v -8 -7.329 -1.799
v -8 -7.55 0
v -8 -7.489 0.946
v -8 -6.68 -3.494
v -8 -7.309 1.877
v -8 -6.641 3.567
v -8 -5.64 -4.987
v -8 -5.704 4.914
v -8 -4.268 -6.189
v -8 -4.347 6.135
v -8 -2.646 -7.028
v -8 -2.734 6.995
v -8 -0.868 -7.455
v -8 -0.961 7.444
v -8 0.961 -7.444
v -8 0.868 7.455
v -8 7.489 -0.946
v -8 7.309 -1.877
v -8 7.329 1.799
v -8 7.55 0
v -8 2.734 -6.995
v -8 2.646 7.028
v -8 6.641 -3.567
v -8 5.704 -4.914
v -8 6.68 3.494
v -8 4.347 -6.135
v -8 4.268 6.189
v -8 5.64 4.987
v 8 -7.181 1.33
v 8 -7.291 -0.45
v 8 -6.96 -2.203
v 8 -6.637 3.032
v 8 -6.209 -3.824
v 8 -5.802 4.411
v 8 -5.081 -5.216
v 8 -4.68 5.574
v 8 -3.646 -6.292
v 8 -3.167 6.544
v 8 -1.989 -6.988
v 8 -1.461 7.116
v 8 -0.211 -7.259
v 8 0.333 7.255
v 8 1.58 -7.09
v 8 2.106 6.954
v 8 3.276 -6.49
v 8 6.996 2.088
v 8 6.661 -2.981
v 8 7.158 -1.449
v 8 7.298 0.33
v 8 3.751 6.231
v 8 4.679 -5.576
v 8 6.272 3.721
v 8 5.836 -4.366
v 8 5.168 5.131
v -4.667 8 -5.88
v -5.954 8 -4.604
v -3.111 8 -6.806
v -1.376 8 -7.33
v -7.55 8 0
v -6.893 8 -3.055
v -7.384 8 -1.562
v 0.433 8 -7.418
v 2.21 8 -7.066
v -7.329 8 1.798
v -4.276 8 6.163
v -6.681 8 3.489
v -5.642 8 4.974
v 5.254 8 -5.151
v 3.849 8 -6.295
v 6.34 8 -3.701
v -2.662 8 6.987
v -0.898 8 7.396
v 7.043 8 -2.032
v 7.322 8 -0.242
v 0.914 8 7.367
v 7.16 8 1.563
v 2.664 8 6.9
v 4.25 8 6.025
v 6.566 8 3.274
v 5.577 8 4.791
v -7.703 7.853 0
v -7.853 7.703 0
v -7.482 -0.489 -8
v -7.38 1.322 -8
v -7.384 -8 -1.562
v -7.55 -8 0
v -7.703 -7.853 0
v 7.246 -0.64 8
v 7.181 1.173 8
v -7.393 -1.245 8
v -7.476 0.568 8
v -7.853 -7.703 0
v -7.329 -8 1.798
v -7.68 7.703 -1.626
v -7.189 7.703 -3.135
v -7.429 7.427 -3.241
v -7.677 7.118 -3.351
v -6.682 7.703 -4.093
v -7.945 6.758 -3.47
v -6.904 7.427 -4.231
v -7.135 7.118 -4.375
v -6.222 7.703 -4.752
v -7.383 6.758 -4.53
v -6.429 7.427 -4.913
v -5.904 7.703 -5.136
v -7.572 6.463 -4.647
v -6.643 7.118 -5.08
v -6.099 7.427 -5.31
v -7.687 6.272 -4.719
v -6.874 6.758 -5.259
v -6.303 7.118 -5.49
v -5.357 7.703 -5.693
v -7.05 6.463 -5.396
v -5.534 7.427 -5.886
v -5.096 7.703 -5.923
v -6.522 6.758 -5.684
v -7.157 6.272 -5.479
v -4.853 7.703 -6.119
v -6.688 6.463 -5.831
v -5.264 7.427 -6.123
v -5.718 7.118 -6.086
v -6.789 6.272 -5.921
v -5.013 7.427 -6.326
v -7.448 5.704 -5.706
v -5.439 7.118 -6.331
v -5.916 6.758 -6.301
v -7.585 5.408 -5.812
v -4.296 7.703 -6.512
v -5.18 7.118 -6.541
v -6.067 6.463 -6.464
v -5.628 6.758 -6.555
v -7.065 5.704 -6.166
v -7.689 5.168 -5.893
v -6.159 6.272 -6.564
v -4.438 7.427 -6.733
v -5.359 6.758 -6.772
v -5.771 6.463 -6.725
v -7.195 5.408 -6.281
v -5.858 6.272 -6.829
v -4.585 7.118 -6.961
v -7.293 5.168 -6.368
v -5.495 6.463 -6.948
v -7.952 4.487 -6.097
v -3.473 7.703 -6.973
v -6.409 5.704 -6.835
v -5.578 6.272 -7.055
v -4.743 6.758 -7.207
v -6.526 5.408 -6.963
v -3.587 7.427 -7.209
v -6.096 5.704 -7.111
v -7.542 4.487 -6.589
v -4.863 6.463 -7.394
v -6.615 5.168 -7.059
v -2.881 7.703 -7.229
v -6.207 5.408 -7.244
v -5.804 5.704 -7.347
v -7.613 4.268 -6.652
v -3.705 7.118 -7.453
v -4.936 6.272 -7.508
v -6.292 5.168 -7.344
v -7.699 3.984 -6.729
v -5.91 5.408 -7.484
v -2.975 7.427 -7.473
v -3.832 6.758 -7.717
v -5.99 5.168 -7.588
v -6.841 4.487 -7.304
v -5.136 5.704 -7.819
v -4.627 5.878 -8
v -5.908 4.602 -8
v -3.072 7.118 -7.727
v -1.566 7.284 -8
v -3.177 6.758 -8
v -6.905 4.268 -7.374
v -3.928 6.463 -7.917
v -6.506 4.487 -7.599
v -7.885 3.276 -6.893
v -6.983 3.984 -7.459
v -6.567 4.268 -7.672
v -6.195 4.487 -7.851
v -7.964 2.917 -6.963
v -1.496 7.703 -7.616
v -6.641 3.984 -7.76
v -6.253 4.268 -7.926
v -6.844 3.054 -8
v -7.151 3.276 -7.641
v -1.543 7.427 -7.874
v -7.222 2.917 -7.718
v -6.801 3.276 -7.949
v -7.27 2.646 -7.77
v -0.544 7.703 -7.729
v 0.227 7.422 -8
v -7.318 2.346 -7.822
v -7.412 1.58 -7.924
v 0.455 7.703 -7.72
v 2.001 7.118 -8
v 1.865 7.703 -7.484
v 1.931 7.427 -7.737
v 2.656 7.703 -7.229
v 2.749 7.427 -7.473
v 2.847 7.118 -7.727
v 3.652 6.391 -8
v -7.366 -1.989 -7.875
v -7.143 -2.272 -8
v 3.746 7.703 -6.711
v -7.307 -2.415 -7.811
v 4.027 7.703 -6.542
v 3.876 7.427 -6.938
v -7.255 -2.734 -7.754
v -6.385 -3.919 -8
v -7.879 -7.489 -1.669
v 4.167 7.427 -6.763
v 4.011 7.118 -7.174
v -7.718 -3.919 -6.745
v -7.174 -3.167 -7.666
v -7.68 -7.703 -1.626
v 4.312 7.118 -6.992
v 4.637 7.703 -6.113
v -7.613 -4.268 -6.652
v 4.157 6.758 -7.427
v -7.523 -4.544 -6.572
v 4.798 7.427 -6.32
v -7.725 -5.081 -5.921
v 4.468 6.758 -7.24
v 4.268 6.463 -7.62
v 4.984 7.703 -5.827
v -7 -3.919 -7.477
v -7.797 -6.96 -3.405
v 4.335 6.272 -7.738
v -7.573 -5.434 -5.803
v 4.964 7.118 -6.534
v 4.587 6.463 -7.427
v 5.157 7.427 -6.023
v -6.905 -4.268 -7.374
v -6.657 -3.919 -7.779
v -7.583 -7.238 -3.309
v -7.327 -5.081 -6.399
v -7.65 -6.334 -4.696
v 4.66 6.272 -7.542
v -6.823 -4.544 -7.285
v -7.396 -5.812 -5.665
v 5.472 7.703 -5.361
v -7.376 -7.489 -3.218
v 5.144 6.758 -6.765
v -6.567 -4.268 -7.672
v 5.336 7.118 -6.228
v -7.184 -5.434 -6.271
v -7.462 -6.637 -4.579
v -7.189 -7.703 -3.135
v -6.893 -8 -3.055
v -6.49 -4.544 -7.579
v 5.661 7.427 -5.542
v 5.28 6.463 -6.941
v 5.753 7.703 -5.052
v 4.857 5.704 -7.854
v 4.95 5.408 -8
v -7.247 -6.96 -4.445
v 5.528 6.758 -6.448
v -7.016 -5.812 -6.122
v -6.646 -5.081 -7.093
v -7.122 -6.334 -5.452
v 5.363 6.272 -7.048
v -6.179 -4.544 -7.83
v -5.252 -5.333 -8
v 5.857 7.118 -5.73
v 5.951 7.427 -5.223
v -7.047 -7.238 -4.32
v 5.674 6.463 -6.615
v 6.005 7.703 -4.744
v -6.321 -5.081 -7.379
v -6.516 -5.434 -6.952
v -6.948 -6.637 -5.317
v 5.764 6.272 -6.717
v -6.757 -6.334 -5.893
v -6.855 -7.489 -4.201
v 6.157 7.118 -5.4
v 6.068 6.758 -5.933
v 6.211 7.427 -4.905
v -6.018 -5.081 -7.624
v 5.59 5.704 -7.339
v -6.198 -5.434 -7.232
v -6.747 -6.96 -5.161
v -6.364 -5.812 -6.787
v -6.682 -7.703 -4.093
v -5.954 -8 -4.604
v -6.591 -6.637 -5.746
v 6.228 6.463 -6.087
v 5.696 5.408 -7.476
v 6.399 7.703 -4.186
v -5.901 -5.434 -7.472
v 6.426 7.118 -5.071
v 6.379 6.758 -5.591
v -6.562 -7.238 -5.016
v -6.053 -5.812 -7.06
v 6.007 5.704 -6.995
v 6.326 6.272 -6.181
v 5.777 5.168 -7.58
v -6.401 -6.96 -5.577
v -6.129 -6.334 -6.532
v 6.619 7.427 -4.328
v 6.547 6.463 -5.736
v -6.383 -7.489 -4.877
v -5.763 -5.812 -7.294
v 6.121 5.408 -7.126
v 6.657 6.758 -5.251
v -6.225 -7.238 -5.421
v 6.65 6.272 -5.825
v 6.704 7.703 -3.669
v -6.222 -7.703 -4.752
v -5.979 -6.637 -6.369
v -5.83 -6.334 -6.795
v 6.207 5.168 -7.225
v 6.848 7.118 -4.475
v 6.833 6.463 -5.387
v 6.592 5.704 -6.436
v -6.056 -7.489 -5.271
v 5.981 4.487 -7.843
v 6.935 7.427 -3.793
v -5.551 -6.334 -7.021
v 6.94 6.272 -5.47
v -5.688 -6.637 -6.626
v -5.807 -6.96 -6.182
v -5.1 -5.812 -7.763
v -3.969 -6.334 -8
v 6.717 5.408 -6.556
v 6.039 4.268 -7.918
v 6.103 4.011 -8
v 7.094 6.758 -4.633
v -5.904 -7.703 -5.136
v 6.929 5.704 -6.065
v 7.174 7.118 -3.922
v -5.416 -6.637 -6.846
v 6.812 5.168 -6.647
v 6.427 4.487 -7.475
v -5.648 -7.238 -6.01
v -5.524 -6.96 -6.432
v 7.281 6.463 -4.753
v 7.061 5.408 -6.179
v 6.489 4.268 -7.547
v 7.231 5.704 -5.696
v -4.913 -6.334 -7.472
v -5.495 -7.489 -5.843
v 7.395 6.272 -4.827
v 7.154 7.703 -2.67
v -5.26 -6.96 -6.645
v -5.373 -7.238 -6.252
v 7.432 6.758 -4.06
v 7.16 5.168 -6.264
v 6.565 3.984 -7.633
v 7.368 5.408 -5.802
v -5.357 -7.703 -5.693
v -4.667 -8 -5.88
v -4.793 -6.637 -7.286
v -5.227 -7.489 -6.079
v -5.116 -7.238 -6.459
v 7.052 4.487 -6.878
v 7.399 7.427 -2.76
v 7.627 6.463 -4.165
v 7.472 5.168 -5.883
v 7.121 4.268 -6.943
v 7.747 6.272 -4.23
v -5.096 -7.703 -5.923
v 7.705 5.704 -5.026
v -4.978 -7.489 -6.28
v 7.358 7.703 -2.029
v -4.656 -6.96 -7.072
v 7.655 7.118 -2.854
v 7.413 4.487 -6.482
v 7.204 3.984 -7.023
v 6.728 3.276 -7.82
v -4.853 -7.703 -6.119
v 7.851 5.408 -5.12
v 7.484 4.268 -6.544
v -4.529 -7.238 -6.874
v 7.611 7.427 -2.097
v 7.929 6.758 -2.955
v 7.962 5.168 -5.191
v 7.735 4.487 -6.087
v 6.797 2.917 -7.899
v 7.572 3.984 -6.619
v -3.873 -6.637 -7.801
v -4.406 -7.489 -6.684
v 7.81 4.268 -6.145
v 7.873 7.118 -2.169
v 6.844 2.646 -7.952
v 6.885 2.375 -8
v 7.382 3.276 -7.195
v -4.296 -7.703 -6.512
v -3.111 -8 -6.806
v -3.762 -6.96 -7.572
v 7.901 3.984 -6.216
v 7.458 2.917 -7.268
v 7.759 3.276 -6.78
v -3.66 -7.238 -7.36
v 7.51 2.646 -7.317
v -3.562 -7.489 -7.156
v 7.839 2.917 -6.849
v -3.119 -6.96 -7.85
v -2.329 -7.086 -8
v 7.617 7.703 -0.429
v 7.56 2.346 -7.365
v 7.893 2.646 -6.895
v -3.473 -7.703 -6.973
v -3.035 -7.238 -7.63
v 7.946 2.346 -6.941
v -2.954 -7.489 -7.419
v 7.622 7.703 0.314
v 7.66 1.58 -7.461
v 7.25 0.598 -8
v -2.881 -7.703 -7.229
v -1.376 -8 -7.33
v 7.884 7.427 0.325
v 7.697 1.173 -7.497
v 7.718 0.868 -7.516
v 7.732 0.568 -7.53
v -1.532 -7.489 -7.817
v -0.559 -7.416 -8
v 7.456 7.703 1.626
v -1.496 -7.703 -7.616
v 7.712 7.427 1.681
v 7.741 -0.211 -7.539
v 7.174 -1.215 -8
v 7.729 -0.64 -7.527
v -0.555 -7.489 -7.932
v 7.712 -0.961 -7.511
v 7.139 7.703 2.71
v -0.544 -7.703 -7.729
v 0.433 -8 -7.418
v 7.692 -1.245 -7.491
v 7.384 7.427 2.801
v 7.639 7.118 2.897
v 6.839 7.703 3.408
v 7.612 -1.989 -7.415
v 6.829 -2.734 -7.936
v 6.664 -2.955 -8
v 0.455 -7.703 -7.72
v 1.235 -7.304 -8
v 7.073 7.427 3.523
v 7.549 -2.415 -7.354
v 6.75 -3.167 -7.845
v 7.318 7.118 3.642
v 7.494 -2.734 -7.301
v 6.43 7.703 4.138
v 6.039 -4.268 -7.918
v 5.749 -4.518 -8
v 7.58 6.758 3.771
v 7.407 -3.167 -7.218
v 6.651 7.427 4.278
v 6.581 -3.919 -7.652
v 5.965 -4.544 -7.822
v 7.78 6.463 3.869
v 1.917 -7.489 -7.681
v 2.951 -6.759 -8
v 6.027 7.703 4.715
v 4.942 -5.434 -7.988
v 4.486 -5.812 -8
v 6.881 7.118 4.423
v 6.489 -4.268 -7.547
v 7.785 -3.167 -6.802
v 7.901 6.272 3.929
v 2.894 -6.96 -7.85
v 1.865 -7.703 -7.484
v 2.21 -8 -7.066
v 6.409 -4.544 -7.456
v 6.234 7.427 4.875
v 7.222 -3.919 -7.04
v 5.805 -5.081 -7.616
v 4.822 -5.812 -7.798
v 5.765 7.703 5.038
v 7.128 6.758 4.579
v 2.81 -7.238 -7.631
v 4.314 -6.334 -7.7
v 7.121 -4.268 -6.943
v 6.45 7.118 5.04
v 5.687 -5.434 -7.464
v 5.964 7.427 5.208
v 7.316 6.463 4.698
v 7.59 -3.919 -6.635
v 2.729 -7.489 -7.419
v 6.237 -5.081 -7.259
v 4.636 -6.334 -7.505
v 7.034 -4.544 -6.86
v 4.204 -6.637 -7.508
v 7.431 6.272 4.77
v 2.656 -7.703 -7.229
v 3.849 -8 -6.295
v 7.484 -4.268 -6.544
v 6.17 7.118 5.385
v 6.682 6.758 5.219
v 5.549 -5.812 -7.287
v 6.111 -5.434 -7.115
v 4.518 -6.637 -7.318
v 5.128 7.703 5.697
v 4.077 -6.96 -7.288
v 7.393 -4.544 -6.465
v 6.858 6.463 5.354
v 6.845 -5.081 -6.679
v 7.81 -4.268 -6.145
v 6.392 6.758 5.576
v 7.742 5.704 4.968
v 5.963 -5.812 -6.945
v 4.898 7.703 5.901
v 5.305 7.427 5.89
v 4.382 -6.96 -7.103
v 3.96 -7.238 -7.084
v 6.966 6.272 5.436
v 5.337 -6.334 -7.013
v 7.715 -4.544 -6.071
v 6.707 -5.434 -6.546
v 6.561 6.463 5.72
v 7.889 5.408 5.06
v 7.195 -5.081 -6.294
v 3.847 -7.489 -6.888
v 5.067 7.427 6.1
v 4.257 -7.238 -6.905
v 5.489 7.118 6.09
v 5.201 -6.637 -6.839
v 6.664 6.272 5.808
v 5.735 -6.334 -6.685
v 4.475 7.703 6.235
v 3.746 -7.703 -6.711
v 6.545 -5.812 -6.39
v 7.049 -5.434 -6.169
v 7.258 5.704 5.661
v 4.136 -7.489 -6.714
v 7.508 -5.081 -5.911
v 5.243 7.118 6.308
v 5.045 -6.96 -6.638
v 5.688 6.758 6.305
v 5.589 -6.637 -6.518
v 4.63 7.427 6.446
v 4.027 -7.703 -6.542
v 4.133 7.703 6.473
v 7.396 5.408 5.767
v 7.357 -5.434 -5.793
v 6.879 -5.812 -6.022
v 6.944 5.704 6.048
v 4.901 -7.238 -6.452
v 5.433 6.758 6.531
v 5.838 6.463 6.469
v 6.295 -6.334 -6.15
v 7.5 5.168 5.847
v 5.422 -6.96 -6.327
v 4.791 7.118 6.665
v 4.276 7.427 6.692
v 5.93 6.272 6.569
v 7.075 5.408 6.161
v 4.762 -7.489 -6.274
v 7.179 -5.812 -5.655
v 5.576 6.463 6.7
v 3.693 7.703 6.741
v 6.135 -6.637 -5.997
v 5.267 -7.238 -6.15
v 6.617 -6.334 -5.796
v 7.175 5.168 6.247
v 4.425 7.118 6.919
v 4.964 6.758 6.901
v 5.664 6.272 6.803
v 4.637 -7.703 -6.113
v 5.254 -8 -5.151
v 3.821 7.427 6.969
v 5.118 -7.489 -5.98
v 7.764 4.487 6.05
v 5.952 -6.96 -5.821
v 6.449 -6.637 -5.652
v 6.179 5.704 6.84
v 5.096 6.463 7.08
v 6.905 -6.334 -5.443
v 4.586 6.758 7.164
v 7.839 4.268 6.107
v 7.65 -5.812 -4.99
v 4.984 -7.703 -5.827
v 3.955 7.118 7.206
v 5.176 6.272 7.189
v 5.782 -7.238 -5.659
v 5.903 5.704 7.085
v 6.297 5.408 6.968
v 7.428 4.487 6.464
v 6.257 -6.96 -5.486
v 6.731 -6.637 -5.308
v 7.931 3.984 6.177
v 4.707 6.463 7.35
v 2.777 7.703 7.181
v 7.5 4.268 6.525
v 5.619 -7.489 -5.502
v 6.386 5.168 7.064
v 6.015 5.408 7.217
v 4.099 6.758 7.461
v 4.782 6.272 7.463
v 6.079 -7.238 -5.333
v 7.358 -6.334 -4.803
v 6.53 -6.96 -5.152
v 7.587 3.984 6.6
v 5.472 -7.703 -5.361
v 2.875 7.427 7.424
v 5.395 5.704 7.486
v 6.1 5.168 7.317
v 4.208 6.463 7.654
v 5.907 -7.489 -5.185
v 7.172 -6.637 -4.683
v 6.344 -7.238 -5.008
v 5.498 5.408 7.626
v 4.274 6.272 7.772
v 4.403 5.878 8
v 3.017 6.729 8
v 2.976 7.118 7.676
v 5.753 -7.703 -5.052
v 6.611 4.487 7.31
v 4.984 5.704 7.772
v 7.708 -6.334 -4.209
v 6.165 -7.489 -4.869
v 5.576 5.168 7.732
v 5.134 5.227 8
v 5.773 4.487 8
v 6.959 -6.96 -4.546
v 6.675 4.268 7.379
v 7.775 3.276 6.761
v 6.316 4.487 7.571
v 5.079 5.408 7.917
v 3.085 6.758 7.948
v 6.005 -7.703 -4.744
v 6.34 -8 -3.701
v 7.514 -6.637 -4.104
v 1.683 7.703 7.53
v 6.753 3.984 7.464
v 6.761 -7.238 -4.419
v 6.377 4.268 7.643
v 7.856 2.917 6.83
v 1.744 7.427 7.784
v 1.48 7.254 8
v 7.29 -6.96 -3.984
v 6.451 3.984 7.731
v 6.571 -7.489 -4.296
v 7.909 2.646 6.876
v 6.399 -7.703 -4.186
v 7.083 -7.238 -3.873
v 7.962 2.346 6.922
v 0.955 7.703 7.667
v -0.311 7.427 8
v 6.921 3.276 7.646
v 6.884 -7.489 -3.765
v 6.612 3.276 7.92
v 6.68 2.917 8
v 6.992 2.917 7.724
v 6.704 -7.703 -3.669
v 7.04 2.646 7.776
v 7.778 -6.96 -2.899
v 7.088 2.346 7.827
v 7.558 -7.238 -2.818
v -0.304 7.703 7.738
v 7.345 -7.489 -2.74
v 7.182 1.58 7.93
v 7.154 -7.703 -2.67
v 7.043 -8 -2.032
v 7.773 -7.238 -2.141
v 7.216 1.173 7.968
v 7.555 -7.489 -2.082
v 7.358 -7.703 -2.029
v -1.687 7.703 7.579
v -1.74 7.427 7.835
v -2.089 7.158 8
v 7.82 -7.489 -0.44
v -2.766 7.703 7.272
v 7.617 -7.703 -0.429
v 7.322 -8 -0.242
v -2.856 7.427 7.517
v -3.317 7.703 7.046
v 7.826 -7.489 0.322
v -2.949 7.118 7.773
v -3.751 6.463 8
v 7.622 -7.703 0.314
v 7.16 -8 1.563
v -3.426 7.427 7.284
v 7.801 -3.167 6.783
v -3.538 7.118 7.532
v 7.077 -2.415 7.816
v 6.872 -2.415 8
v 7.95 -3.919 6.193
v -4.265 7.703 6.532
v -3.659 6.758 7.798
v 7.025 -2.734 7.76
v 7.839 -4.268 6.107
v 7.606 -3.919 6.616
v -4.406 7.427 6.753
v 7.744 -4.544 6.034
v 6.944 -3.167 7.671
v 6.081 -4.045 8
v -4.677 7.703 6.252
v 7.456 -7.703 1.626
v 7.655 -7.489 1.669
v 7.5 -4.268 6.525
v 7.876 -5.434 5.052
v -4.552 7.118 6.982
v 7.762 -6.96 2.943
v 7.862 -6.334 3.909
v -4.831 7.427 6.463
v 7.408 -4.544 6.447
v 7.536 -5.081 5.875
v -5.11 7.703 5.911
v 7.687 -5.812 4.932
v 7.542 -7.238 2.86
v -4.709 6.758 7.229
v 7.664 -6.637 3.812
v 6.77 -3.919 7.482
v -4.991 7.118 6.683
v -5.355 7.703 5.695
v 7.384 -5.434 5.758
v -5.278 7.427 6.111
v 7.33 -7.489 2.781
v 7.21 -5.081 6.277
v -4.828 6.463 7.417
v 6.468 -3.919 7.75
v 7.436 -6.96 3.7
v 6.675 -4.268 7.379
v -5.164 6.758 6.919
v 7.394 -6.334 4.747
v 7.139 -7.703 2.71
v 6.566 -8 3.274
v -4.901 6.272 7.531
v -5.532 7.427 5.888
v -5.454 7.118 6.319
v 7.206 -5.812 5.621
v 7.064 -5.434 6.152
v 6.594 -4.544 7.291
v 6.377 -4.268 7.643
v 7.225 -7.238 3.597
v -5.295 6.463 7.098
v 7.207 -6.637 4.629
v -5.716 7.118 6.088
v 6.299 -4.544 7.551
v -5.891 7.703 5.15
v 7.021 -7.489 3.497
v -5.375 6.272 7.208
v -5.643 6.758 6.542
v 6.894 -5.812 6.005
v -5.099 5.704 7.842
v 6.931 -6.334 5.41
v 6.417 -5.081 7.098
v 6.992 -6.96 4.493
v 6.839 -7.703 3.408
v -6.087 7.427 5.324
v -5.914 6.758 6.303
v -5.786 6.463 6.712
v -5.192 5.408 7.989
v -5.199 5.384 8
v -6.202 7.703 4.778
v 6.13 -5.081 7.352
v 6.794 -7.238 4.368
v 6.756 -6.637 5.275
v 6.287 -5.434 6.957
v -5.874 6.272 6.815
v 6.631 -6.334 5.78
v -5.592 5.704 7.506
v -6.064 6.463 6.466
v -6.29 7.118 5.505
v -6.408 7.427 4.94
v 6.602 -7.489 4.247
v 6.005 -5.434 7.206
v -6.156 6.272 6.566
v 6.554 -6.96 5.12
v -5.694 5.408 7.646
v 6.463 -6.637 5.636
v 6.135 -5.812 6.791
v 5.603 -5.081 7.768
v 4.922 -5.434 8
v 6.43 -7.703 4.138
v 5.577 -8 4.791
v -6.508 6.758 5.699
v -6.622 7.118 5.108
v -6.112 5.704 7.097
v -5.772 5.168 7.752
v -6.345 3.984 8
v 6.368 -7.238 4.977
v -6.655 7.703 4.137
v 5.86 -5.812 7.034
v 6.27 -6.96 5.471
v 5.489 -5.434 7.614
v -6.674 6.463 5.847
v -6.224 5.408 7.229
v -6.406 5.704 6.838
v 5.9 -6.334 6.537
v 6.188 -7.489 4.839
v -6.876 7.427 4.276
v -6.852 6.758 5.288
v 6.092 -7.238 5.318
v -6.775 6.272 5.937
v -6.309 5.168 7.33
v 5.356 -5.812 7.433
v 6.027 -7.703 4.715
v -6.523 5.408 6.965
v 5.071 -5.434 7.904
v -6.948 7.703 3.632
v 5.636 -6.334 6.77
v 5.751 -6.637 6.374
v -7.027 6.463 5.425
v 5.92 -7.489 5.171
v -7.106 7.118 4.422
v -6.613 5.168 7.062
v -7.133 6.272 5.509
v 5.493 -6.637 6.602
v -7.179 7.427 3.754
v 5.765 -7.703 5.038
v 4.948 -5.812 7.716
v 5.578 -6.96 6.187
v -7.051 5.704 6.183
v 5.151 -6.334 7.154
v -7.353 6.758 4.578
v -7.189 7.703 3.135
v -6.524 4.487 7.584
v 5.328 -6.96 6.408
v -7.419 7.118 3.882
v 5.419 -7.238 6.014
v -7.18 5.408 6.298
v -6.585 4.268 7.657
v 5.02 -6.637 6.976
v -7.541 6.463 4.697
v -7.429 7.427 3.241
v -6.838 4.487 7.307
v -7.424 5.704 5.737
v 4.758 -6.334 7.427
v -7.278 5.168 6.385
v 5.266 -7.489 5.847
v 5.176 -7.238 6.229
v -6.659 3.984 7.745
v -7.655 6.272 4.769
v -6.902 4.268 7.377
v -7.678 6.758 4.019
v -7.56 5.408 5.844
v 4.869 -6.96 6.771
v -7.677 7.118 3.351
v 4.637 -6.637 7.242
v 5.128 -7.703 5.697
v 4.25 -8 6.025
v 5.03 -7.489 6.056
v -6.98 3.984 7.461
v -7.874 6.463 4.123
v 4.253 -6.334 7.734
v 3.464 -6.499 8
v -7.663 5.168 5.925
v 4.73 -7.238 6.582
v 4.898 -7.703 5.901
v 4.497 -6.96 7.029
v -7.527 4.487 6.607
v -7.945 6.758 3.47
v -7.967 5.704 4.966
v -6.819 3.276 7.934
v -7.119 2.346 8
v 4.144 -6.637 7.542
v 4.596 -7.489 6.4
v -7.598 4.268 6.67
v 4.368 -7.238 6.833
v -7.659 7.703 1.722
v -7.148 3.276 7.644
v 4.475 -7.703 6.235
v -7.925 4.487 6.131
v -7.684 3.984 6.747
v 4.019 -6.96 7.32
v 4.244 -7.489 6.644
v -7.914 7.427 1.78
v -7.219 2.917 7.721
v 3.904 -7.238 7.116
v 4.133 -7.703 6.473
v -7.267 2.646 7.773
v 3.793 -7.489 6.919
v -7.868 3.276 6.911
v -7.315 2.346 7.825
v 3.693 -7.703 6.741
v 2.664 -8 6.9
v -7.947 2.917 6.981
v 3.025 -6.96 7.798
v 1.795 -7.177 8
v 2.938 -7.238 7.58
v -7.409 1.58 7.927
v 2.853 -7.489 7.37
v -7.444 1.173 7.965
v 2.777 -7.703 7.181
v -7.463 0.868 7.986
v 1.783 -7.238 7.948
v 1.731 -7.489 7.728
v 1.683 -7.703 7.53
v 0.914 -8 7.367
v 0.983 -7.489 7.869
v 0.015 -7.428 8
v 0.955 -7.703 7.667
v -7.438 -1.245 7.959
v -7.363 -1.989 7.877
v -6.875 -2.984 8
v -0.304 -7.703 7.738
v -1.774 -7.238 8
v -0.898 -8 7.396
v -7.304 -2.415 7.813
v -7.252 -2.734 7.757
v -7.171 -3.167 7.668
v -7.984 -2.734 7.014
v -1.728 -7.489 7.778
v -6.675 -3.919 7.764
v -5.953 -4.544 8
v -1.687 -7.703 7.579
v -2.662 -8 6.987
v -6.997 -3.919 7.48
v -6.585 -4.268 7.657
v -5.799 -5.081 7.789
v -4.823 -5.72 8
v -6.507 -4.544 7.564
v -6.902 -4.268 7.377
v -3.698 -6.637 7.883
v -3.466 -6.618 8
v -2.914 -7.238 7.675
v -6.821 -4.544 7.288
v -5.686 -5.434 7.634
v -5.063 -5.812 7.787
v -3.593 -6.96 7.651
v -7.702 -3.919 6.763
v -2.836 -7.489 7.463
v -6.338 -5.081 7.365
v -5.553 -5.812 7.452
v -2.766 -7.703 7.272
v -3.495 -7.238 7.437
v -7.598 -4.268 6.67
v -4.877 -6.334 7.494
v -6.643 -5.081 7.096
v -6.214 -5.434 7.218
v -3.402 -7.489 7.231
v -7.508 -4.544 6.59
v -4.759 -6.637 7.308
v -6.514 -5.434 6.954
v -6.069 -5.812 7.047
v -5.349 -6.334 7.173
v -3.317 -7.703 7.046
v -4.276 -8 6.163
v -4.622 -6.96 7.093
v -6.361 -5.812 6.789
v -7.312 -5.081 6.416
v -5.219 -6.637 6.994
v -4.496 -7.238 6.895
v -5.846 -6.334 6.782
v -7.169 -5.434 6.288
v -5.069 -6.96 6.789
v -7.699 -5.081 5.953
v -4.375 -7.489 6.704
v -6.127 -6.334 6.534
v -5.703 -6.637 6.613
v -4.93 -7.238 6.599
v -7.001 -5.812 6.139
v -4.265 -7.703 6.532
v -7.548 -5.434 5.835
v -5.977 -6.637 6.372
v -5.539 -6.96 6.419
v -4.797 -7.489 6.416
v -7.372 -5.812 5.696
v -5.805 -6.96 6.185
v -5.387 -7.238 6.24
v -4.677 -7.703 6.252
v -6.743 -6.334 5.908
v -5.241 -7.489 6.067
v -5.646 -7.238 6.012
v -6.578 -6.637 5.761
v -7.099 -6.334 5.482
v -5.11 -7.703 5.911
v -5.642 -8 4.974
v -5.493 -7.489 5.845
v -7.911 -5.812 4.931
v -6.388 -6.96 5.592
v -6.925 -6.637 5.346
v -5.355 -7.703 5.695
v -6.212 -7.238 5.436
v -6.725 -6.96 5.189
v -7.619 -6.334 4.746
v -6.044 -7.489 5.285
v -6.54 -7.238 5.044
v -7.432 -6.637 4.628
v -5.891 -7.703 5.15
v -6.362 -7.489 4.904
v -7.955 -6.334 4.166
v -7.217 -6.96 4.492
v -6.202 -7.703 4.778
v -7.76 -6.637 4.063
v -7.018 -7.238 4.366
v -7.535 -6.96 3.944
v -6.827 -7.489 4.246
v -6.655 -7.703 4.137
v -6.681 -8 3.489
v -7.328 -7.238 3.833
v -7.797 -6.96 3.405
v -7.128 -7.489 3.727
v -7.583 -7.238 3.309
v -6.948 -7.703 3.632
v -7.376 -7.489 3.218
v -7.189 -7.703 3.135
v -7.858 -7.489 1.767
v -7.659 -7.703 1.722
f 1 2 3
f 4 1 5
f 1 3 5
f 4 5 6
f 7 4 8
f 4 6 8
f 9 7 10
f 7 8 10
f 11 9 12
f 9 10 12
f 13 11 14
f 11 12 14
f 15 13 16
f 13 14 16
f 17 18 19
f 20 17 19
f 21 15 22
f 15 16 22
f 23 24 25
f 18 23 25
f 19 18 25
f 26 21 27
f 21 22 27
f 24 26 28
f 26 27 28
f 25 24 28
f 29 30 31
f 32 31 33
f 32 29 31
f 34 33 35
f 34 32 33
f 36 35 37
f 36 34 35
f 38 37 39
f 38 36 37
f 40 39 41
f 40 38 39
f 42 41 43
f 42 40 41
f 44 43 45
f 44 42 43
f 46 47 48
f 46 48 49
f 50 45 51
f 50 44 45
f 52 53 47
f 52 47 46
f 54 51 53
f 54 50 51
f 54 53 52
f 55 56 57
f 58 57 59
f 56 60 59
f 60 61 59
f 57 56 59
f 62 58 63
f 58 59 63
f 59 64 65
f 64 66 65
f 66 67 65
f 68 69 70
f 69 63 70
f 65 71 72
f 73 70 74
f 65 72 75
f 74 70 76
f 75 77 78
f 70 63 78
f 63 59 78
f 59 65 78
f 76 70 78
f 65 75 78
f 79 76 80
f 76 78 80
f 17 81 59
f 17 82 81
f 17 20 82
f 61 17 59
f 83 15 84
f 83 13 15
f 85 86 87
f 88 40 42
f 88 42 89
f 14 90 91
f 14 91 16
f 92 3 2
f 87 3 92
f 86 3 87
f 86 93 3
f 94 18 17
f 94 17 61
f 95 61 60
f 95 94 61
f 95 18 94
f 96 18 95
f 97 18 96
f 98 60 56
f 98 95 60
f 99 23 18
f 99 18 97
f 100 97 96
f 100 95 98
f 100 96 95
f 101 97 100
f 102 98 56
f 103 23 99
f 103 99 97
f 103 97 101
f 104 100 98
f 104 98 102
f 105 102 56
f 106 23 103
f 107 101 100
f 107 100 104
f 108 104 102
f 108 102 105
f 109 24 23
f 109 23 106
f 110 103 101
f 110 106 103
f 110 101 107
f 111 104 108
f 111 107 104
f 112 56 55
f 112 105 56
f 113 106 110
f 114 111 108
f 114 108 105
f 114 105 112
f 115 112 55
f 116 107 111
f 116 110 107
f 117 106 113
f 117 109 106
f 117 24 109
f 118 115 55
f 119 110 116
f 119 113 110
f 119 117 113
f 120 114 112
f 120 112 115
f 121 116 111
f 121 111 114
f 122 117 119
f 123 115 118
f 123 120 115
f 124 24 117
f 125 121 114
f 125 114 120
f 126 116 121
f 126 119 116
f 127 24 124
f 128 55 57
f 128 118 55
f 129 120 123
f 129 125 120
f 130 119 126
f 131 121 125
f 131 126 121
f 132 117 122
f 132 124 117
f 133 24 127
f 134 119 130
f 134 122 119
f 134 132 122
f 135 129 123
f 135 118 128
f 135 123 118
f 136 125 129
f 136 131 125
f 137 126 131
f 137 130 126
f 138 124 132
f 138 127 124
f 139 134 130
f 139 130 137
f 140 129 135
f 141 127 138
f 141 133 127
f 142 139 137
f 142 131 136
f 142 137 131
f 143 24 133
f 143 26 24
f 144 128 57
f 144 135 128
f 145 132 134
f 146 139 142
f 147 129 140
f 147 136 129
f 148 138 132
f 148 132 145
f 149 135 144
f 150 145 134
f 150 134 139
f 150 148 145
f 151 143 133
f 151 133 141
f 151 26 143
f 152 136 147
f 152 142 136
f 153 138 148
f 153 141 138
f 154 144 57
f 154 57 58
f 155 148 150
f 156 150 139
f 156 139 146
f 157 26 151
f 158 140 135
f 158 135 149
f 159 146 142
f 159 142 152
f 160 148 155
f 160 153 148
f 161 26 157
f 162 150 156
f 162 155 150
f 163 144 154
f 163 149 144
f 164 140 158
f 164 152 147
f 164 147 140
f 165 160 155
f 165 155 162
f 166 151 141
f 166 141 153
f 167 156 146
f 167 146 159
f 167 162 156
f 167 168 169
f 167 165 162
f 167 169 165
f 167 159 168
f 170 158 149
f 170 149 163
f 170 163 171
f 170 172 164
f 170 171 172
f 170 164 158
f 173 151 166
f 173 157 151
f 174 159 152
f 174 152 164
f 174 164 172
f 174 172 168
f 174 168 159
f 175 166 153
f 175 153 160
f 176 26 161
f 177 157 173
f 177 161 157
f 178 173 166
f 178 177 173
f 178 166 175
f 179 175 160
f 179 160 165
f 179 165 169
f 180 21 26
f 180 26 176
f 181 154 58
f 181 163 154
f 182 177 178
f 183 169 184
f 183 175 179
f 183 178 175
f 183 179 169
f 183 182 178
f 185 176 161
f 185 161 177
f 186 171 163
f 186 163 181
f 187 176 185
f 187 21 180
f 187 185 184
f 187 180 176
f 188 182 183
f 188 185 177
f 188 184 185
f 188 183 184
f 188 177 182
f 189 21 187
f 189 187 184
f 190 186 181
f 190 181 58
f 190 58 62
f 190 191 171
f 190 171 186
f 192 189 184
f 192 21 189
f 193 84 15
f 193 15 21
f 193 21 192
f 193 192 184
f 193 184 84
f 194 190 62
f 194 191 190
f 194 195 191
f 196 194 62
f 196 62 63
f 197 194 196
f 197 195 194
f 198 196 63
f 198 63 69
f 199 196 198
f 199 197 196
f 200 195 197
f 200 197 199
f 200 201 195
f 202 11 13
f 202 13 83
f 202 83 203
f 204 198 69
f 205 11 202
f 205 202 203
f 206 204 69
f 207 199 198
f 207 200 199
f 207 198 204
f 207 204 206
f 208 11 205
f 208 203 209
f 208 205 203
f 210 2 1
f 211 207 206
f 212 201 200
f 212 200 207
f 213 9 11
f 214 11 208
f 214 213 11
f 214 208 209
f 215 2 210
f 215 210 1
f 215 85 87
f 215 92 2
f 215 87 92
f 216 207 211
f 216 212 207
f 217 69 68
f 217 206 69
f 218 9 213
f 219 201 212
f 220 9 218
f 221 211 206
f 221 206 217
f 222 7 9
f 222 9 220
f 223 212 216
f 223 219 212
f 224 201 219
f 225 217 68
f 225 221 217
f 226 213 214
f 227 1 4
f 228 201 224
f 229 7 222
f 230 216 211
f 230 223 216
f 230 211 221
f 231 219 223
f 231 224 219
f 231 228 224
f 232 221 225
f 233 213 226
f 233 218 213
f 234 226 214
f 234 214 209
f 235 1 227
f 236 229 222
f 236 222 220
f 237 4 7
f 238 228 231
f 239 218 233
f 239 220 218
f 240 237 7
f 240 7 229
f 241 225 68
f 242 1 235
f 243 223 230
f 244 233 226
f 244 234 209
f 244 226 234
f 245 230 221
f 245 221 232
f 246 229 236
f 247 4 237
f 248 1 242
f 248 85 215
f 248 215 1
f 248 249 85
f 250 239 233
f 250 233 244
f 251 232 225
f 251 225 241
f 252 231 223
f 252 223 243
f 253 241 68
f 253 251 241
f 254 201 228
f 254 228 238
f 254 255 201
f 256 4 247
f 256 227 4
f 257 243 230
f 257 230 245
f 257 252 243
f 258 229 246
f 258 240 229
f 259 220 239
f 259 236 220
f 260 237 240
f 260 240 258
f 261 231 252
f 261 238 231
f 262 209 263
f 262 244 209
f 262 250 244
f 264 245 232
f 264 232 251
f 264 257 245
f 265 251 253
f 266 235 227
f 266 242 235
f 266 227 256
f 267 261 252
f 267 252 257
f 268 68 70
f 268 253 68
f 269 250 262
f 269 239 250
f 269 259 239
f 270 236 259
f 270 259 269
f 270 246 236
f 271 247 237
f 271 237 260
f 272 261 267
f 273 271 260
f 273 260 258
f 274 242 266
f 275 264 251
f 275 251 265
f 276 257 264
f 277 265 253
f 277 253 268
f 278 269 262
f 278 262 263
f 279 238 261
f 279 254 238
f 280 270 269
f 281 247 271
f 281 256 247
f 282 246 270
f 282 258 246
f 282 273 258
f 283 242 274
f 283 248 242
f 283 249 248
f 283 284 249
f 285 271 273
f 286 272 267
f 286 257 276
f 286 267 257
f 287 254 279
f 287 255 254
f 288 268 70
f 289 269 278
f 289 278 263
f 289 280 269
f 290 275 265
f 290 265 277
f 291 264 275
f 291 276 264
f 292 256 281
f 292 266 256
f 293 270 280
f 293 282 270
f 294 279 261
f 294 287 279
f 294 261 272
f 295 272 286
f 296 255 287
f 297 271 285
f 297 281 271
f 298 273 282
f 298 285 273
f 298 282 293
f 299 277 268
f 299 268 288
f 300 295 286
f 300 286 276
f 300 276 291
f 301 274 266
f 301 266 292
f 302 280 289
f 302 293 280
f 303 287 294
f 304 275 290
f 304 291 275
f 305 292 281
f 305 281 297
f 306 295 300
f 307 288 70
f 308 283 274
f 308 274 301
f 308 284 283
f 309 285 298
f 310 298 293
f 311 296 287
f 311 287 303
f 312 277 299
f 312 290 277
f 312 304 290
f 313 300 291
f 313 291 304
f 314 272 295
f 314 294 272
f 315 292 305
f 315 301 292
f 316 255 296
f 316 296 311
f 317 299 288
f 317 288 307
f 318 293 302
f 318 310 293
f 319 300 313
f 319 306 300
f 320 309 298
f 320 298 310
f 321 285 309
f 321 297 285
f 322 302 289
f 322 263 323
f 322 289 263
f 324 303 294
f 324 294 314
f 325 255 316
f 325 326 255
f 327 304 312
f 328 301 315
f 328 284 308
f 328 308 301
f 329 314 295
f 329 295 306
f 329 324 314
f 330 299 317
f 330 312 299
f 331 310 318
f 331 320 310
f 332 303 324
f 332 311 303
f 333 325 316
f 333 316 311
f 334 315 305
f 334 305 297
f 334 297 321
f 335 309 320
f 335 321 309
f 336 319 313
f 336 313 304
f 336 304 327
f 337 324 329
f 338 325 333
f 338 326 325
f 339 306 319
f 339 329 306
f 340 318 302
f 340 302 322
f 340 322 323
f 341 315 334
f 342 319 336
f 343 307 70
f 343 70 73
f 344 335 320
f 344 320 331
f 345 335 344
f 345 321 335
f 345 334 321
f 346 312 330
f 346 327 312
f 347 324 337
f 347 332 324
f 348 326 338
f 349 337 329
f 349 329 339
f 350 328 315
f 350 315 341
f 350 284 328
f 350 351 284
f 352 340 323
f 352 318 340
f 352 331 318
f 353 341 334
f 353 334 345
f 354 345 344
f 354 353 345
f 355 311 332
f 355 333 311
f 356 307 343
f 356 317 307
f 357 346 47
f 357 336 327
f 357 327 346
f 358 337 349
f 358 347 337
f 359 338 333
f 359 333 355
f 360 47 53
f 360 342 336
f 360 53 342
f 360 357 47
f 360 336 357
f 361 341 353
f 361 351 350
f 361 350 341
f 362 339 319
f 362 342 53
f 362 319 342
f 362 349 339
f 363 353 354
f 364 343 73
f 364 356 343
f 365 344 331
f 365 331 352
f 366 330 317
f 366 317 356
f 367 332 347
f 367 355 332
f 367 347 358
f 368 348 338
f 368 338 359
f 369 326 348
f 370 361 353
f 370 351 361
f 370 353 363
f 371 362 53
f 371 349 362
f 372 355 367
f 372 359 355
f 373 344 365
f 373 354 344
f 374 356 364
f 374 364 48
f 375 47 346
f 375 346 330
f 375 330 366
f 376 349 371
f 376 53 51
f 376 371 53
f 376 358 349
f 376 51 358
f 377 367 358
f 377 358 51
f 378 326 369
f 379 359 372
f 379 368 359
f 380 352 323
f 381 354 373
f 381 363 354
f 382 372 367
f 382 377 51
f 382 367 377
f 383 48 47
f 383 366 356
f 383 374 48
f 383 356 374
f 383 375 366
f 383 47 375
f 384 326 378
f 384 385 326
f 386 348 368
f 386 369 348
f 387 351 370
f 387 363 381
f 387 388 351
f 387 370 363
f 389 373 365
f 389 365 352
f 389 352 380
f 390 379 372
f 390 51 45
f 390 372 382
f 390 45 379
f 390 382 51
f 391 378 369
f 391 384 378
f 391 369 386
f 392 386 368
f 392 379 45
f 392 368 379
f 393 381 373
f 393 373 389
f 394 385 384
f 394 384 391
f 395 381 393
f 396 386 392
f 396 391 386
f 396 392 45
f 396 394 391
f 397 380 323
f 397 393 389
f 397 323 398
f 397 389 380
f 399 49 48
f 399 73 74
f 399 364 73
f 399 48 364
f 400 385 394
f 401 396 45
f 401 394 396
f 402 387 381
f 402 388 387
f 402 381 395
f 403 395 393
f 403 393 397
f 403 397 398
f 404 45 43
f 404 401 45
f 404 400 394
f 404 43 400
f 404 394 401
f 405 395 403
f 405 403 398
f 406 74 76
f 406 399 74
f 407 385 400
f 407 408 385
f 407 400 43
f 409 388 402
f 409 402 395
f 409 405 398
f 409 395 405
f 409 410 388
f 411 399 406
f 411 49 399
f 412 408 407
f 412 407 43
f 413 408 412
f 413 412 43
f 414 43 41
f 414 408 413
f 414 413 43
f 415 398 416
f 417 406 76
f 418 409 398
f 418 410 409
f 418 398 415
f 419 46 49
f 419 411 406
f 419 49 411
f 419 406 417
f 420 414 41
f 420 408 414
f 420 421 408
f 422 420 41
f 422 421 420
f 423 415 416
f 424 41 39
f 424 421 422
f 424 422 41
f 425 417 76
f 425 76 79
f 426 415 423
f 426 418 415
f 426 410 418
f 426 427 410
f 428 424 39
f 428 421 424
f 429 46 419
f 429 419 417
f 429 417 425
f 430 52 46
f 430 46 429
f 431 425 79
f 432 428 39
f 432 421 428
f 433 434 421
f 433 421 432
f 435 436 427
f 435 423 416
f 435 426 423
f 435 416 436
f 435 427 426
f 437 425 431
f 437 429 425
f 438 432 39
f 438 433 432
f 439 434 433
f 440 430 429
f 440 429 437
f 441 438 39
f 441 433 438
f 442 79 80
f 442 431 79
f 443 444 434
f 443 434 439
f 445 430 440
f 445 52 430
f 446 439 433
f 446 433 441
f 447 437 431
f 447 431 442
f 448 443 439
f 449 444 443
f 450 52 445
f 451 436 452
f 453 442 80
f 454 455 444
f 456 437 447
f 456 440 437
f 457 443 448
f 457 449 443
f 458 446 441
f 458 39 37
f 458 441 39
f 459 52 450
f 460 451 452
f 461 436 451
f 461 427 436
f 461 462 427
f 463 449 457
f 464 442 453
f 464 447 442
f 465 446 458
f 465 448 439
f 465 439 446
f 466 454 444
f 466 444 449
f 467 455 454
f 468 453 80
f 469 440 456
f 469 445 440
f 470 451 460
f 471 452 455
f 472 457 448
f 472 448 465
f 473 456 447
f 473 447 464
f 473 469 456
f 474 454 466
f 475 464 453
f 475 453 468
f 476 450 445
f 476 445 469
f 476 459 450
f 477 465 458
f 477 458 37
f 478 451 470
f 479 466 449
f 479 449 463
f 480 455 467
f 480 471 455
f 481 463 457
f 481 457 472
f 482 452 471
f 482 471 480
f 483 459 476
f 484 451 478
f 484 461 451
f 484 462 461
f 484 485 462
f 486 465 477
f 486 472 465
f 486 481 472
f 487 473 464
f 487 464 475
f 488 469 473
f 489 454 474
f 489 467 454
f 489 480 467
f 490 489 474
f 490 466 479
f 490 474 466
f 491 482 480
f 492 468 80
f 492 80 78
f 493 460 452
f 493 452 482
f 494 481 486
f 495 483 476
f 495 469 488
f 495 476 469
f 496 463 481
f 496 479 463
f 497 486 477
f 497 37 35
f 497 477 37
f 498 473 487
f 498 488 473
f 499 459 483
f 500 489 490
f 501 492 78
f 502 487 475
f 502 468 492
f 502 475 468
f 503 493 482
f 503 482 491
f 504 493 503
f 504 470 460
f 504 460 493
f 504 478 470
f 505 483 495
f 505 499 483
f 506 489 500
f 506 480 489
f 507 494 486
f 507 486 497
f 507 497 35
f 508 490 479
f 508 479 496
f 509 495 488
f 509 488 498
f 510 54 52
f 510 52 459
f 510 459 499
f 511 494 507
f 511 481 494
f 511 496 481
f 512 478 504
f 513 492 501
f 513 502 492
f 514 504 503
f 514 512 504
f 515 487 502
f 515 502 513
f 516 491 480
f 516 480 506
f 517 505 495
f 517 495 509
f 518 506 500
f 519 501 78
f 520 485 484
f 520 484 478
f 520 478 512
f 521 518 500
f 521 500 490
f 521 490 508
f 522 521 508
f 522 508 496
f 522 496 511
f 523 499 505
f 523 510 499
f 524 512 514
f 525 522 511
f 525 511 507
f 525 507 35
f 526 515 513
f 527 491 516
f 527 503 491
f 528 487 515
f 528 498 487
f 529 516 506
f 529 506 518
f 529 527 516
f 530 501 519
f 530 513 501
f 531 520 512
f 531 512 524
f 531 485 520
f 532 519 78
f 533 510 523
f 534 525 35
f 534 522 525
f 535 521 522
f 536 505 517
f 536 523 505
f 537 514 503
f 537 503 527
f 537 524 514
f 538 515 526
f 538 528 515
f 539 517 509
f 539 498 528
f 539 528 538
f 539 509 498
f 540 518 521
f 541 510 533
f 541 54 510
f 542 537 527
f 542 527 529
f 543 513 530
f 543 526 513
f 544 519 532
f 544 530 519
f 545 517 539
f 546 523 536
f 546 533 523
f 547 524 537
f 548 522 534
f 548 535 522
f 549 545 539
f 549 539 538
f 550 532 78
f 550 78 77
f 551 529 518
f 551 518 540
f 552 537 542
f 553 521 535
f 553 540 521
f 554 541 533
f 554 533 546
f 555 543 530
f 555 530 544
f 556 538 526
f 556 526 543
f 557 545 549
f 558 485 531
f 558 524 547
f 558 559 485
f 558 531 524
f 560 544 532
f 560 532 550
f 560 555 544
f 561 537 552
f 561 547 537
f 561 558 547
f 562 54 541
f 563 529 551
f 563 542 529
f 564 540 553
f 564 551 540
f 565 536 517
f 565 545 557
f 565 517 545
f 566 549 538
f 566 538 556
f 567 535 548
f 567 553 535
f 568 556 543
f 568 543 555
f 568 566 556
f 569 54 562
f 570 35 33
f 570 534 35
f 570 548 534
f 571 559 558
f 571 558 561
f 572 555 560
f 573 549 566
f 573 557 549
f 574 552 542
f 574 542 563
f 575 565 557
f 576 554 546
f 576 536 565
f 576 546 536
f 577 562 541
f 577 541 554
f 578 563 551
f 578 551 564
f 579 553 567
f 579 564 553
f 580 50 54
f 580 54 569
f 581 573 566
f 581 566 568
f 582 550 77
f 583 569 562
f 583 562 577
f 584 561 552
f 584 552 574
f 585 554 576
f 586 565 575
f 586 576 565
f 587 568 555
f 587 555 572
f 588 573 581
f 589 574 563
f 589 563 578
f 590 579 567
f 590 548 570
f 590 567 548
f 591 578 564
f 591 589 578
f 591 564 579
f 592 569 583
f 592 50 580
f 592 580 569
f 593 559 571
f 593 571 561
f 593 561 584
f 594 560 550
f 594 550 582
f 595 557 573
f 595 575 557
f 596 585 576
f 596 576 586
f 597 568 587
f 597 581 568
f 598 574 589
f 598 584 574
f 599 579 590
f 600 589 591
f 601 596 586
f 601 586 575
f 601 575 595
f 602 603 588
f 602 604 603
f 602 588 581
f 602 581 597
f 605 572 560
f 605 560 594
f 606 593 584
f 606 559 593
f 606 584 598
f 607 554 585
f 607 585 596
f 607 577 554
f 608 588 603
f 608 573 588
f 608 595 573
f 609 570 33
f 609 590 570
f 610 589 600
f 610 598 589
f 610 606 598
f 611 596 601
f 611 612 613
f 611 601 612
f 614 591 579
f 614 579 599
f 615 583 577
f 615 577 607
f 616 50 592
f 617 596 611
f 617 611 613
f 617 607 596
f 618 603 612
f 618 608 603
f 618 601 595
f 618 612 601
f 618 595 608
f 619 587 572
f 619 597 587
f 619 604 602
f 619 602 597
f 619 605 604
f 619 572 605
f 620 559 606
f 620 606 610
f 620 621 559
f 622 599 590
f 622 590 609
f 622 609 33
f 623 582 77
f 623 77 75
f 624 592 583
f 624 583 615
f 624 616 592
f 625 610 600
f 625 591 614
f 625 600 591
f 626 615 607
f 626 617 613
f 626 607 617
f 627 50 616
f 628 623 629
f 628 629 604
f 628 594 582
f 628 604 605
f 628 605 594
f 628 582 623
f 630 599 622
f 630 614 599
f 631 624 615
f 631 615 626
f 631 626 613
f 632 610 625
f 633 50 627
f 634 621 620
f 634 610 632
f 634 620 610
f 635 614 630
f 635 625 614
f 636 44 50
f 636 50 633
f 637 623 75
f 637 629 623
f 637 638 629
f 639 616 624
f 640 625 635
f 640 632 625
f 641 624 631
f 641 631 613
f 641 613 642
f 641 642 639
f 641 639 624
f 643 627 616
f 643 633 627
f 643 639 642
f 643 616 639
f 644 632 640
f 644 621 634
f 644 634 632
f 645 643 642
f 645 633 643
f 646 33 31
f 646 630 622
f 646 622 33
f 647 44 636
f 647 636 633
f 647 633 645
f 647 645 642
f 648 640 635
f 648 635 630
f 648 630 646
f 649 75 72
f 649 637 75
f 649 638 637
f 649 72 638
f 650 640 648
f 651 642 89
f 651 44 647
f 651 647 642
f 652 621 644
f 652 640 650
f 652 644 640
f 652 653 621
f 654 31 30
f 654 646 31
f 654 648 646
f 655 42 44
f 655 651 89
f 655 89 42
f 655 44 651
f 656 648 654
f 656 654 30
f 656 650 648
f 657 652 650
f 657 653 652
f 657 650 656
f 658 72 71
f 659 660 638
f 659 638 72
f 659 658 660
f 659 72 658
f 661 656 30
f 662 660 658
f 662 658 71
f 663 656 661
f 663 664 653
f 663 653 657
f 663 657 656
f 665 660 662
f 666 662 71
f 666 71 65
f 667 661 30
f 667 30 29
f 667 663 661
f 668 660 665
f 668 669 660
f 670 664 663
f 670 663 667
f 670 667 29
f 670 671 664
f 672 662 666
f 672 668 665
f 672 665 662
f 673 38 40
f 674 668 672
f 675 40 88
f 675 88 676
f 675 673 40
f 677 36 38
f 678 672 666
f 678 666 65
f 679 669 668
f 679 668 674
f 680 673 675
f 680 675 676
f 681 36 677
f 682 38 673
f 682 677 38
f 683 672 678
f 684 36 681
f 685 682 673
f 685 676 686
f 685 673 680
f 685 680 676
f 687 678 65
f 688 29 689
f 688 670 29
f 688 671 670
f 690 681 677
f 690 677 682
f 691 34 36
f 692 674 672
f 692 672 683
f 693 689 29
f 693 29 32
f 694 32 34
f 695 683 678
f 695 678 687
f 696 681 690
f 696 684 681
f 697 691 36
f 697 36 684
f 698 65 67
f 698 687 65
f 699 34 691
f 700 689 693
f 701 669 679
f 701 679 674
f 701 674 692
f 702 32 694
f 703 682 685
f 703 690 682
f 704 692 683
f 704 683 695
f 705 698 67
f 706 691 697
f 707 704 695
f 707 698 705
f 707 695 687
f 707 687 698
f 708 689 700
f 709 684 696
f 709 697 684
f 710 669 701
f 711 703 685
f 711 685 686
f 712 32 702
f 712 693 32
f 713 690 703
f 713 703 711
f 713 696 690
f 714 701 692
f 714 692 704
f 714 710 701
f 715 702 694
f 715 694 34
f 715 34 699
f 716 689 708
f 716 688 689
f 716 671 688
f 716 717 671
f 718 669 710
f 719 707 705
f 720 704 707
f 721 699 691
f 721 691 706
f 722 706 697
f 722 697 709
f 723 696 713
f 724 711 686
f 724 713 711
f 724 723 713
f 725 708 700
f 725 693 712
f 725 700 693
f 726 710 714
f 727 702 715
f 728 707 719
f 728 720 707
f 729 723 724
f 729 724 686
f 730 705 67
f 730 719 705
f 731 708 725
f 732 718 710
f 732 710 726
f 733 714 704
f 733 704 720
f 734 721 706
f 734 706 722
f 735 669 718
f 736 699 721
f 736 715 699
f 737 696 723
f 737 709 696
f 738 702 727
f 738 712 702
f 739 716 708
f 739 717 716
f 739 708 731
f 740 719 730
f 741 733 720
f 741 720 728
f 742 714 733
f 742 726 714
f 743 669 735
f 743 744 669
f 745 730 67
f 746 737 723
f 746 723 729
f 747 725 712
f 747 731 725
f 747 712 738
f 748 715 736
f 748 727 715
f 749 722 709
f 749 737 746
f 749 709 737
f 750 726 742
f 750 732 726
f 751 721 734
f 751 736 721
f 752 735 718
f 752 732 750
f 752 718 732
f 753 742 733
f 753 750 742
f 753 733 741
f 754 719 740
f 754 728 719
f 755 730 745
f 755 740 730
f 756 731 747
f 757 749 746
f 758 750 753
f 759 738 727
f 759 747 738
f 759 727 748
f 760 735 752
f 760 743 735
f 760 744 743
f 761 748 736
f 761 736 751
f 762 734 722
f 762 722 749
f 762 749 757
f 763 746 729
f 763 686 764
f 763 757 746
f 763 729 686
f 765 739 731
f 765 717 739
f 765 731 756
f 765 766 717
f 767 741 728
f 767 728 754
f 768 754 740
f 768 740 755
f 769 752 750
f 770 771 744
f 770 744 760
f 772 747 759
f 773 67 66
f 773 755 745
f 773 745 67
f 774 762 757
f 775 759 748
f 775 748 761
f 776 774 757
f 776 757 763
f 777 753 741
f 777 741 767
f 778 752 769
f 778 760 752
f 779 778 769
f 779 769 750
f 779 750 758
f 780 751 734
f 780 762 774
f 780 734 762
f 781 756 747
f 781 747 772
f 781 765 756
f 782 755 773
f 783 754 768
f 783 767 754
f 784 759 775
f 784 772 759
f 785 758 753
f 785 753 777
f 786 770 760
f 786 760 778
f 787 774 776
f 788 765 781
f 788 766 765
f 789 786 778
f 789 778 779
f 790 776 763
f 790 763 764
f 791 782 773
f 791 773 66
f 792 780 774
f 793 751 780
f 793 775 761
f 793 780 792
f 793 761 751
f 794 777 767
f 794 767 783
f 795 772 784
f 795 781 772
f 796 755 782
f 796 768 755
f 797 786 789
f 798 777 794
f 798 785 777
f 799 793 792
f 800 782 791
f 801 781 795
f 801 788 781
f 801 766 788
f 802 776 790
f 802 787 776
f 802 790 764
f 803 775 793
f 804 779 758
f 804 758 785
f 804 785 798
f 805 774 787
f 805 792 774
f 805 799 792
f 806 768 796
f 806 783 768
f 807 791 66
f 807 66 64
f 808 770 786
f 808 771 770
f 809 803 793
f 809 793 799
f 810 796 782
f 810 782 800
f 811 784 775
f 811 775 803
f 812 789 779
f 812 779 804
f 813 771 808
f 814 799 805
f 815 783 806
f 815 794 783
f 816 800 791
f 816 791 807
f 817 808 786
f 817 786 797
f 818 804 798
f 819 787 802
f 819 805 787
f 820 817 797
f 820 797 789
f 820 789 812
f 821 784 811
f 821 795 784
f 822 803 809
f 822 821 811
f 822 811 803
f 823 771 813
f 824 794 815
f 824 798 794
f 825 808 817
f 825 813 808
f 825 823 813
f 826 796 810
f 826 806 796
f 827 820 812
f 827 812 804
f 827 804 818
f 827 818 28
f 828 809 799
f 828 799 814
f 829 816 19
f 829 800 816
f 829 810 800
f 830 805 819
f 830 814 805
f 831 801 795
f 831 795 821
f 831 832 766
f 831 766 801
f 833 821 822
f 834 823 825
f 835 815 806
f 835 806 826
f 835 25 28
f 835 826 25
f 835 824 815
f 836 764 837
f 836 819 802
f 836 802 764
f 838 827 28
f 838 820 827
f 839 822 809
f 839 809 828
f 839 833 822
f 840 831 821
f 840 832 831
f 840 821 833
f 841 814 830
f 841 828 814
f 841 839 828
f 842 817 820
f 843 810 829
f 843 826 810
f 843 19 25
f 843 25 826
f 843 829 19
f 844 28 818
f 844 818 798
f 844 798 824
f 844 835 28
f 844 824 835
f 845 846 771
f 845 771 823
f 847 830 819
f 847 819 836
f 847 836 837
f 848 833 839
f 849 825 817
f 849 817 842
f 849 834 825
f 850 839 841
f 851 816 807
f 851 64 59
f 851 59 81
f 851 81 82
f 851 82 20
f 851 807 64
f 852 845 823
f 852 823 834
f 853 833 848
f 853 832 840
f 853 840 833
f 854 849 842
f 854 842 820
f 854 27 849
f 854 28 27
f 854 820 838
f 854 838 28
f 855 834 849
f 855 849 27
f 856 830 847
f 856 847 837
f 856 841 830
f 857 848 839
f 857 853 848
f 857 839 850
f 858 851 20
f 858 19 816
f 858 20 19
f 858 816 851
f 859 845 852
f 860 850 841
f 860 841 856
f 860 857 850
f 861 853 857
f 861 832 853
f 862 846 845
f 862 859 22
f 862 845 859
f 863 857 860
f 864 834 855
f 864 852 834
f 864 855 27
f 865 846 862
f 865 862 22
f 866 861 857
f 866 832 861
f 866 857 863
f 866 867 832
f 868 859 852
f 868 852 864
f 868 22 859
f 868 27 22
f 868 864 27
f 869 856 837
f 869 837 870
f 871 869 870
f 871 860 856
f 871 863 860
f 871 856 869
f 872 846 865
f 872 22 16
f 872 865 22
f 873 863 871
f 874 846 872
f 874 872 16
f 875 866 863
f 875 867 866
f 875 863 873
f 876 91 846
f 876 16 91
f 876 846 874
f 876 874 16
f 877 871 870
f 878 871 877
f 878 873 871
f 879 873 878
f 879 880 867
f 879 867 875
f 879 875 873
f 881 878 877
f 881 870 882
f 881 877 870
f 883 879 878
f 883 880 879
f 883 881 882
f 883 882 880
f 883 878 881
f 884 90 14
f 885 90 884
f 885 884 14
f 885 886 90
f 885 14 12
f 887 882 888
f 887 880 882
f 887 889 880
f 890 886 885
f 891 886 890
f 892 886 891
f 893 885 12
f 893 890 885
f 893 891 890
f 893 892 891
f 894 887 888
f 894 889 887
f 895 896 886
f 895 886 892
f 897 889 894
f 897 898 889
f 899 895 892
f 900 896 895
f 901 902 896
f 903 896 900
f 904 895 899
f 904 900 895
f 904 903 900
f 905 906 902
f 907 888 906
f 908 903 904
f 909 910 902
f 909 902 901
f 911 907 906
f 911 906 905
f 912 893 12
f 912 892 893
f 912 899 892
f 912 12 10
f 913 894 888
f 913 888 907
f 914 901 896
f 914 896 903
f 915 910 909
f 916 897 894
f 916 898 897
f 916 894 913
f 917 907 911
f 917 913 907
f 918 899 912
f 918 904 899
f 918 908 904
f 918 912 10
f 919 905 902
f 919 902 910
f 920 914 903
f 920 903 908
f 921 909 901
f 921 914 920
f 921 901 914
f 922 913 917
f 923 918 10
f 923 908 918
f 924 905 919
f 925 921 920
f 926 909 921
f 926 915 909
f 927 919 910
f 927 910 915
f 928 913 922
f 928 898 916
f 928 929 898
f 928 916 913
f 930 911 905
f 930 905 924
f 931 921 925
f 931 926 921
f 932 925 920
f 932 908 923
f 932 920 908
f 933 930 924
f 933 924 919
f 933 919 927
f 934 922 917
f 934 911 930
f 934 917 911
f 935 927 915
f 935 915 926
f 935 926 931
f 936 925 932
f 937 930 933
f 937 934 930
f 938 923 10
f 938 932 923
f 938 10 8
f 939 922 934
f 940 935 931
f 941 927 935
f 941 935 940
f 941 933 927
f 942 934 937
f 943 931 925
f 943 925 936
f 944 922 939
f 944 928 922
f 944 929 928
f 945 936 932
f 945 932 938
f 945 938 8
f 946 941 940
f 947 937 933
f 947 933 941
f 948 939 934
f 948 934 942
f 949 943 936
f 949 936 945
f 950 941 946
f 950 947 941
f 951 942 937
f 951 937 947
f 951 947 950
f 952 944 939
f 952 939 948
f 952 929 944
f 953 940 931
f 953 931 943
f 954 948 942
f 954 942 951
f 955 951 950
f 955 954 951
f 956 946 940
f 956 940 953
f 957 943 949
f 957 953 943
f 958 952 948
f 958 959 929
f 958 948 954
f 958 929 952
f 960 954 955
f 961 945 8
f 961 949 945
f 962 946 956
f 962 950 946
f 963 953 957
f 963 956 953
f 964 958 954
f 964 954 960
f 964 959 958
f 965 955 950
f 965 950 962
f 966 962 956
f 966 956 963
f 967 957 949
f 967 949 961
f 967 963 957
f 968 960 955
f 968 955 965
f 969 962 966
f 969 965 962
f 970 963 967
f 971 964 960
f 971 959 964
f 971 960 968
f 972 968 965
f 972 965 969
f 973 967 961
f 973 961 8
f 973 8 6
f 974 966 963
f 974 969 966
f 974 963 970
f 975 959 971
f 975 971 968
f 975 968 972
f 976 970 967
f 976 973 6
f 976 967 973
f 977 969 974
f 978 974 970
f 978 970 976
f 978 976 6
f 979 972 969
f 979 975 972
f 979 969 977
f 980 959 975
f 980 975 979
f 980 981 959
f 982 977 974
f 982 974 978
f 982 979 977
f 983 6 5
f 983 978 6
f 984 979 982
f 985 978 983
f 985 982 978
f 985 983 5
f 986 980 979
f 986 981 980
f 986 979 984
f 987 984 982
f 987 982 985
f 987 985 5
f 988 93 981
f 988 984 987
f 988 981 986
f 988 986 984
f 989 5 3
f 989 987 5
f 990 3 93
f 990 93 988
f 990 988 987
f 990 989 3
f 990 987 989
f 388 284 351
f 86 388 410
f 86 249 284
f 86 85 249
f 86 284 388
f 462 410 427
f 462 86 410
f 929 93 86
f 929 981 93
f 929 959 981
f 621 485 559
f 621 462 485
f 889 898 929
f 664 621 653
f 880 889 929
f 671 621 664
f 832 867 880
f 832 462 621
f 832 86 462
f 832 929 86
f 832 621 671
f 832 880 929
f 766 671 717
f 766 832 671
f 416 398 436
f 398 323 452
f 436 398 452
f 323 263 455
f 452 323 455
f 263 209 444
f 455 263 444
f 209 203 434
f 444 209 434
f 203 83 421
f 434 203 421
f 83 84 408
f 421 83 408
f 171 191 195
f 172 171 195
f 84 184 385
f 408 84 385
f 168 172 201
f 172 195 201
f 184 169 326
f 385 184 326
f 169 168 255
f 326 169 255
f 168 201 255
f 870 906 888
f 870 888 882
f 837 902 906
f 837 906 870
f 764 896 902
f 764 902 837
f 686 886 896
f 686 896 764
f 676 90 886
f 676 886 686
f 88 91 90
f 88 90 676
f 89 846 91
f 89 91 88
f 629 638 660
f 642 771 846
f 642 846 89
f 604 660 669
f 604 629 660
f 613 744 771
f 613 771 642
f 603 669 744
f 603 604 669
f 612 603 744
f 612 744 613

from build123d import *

# Parameters (mm, degrees)
F0_W     = 16
F0_H     = 16
F1_DEPTH = 8


with BuildPart() as f1:
    # F0 (on Top) → F1 (new body, symmetric)
    with BuildSketch(Plane.XY):
        Rectangle(F0_W, F0_H)
    extrude(amount=F1_DEPTH, both=True)

    # F2 (on Top) → F3 (revolve, intersect)
    with BuildSketch(Plane.XY):
        with BuildLine():
            Line((-0.111992, -10.99943), (-0.111992, 10.99943))
            ThreePointArc((-0.111992, 10.99943), (-11, 0), (-0.111992, -10.99943))
        make_face()
    revolve(axis=Axis((-0.111992, 0, 0), (0, -1, 0)), mode=Mode.INTERSECT)


solid = f1.part
